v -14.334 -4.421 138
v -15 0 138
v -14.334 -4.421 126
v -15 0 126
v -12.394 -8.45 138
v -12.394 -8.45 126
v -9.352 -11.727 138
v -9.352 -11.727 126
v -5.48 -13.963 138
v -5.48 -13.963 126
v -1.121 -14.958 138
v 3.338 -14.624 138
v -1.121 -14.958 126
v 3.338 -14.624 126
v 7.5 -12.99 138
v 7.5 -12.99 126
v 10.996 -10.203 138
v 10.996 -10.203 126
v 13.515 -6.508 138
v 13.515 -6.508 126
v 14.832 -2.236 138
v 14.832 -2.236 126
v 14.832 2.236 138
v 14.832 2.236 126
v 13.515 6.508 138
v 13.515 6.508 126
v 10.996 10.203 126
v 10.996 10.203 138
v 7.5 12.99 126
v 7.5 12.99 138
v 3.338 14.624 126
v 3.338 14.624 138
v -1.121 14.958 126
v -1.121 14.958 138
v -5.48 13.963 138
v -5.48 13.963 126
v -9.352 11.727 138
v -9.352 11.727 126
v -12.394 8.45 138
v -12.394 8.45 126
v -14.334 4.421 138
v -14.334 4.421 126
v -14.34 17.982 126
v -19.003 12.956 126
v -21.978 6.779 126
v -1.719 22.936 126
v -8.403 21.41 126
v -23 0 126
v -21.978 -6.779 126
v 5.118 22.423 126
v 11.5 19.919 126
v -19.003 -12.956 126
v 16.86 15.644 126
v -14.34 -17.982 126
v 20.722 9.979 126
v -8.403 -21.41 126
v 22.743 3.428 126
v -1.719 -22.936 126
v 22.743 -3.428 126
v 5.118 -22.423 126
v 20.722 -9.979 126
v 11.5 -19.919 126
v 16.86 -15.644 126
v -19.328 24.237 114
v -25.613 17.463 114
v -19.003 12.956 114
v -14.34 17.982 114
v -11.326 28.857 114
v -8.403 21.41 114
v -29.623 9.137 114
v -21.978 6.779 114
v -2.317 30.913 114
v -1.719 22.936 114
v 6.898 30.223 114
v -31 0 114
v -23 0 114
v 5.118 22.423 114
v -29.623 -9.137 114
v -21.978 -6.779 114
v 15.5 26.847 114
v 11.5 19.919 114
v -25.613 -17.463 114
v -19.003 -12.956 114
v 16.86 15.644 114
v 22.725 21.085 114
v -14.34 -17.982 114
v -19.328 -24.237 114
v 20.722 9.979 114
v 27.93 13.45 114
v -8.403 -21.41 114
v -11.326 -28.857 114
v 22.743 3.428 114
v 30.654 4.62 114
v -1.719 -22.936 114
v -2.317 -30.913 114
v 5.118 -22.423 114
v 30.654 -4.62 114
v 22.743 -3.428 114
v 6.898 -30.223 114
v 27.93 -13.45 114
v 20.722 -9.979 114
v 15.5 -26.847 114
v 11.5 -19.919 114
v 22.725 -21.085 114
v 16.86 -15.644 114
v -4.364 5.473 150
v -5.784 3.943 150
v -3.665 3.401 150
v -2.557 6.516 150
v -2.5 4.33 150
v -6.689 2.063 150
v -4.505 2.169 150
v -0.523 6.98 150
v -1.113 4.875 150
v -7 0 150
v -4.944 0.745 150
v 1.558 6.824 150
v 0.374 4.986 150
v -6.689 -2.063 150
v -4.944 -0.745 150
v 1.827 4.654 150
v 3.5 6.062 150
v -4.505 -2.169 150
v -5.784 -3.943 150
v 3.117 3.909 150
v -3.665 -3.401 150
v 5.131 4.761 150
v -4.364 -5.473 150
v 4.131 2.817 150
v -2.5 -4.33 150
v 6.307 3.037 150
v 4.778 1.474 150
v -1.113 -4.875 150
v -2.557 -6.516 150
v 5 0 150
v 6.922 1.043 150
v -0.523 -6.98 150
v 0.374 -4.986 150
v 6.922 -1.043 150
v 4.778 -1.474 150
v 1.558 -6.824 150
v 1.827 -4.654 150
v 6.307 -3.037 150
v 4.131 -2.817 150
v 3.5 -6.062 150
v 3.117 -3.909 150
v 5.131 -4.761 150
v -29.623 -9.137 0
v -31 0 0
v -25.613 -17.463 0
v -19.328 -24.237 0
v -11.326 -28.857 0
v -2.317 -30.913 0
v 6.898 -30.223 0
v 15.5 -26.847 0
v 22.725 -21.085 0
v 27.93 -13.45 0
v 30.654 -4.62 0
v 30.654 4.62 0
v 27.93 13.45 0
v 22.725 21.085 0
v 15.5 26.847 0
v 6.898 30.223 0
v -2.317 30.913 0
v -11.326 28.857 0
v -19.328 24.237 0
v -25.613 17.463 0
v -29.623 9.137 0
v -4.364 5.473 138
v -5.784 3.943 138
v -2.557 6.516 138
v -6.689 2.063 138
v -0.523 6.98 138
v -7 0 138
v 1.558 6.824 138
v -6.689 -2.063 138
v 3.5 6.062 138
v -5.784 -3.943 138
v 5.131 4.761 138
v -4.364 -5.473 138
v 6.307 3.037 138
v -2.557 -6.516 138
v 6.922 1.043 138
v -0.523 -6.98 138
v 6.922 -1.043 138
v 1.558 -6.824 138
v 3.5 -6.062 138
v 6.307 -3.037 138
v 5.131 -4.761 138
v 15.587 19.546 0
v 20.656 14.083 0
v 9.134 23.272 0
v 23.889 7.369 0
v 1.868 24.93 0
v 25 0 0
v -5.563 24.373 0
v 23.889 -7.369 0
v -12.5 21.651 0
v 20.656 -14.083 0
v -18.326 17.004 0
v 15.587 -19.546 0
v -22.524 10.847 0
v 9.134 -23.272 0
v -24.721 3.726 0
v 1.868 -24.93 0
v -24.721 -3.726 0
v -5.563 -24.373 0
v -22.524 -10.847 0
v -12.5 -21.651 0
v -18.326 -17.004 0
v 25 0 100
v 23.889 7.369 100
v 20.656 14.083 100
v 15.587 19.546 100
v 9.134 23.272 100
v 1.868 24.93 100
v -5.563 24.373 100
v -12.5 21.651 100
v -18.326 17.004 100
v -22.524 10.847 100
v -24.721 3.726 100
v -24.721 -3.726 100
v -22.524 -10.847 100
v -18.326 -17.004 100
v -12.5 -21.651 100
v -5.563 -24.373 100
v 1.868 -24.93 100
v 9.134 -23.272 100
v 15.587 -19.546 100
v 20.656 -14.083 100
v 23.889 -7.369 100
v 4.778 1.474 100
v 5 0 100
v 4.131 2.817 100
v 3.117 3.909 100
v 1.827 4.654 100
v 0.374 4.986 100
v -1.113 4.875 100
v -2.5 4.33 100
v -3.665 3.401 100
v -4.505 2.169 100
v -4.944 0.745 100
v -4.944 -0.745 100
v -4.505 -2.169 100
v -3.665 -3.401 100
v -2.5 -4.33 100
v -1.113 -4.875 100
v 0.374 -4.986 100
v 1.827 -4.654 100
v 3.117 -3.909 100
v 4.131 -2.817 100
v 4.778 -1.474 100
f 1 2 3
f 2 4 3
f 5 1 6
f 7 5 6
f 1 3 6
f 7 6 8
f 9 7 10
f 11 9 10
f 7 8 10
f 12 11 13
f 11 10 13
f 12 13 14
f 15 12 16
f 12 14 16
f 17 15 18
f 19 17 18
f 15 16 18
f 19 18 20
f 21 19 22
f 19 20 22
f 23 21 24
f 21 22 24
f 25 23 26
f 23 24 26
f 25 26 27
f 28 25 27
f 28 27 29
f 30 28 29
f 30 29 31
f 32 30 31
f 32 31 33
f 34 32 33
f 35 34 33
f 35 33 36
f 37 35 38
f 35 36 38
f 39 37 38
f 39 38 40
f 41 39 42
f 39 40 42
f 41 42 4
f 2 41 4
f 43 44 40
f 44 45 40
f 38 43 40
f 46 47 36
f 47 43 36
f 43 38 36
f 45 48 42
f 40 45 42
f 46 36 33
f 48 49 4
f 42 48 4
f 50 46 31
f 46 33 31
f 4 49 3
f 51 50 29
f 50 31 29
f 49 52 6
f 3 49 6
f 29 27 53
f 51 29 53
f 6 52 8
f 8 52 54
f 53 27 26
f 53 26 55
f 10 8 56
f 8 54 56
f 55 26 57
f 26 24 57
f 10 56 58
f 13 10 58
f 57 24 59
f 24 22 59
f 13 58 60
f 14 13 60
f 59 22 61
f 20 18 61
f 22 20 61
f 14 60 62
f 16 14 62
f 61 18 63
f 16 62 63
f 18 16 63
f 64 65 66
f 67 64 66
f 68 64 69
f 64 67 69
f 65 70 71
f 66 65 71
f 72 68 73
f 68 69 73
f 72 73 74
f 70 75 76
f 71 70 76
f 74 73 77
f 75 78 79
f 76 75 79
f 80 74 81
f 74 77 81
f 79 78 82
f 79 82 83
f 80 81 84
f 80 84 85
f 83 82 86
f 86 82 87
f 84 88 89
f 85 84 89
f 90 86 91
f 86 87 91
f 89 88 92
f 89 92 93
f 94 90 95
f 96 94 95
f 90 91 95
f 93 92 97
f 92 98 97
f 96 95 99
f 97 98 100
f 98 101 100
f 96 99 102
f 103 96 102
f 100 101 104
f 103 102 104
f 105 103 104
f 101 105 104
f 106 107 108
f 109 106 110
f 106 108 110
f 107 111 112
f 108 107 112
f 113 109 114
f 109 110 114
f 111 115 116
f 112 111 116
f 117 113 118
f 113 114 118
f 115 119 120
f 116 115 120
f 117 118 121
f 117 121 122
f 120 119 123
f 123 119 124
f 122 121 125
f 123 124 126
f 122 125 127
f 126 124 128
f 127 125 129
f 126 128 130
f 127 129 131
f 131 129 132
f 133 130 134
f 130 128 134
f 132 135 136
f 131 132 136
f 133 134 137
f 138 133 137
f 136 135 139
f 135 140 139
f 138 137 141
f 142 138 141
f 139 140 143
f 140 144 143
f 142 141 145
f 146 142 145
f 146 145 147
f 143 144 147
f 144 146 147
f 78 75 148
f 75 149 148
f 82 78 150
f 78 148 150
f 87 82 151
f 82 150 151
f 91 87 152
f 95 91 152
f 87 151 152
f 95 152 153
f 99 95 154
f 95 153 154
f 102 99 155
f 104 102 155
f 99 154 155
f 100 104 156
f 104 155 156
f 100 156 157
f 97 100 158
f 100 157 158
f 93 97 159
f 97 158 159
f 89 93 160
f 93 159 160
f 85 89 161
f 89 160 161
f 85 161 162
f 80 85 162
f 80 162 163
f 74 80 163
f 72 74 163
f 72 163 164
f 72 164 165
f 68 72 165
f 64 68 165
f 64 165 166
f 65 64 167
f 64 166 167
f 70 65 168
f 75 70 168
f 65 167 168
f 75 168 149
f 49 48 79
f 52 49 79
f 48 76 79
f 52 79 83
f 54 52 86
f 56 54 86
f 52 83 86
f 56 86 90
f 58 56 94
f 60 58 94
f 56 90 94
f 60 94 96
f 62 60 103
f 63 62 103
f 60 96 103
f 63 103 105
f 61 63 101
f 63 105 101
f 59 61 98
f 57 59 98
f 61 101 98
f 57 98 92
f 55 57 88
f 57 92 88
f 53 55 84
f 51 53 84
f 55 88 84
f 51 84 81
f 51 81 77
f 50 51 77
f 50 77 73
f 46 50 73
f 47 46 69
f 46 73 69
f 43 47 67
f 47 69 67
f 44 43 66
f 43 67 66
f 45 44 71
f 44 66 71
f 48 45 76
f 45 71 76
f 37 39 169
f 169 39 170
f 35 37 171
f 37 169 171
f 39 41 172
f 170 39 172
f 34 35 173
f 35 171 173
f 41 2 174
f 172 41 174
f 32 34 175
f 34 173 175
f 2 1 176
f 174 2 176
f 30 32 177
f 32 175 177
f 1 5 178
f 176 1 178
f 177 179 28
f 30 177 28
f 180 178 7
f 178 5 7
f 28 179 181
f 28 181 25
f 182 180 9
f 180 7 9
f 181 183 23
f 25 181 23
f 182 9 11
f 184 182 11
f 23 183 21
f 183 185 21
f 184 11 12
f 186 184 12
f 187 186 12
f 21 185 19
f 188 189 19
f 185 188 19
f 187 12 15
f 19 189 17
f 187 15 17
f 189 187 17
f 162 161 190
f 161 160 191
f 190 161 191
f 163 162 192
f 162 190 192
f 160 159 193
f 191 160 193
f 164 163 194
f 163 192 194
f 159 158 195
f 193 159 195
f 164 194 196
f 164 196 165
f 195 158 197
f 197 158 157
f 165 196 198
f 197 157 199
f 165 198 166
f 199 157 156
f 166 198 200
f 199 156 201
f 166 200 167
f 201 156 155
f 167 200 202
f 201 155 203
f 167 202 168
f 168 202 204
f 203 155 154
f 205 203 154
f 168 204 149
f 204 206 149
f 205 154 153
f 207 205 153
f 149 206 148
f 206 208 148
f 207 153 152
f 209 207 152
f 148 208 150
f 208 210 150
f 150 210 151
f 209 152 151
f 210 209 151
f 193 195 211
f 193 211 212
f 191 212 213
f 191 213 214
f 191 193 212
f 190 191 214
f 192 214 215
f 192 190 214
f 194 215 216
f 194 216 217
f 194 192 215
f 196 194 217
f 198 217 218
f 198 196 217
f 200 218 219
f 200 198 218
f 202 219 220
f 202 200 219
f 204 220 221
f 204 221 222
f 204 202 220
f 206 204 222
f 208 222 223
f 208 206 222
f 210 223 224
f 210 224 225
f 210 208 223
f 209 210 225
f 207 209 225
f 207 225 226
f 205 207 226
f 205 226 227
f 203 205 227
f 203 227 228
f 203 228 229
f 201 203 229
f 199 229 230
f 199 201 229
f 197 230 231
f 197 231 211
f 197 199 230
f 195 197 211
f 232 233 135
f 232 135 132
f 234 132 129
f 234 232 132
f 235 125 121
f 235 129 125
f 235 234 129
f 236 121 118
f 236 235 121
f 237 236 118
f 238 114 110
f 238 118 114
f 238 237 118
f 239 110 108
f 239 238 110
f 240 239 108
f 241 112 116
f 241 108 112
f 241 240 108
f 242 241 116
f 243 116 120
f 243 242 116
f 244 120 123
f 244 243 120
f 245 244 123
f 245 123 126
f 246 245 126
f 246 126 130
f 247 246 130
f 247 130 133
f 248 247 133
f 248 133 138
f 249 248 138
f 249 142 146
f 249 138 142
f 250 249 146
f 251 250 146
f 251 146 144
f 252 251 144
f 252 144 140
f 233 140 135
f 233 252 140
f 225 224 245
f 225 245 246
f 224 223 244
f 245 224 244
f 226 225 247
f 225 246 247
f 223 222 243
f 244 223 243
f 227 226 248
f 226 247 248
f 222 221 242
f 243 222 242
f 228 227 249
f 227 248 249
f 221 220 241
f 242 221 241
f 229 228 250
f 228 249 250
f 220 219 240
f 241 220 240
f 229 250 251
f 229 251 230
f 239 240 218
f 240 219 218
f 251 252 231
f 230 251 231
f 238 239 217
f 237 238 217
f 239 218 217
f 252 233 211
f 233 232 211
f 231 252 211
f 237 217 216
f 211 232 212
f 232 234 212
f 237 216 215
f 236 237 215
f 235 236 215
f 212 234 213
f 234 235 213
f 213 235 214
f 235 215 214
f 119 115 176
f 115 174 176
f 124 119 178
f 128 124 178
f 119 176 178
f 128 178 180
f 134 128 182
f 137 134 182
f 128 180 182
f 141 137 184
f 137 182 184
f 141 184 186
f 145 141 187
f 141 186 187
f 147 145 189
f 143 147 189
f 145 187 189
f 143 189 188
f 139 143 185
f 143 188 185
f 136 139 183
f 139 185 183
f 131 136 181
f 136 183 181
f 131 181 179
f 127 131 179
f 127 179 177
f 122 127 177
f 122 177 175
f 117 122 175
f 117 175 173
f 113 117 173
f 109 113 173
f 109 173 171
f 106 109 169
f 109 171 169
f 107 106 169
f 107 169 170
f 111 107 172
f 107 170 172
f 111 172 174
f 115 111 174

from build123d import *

# Parameters (mm, degrees)
F2_R     = 25
F3_DEPTH = 100
F4_R     = 5
F5_DEPTH = 150.001


with BuildPart() as f1:
    # F0 (on Front) → F1 (revolve)
    with BuildSketch(Plane.XZ):
        Polygon((-31, 0), (0, 0), (0, 150), (-7, 150), (-7, 138), (-15, 138), (-15, 126), (-23, 126), (-23, 114), (-31, 114), align=None)
    revolve(axis=Axis((0, 0, 75), (0, 0, 1)))

    # F2 (on Top) → F3 (cut)
    with BuildSketch(Plane.XY):
        Circle(F2_R)
    extrude(amount=F3_DEPTH, mode=Mode.SUBTRACT)

    # F4 (on Top) → F5 (cut, through all)
    with BuildSketch(Plane.XY):
        Circle(F4_R)
    extrude(amount=F5_DEPTH, mode=Mode.SUBTRACT)


solid = f1.part
